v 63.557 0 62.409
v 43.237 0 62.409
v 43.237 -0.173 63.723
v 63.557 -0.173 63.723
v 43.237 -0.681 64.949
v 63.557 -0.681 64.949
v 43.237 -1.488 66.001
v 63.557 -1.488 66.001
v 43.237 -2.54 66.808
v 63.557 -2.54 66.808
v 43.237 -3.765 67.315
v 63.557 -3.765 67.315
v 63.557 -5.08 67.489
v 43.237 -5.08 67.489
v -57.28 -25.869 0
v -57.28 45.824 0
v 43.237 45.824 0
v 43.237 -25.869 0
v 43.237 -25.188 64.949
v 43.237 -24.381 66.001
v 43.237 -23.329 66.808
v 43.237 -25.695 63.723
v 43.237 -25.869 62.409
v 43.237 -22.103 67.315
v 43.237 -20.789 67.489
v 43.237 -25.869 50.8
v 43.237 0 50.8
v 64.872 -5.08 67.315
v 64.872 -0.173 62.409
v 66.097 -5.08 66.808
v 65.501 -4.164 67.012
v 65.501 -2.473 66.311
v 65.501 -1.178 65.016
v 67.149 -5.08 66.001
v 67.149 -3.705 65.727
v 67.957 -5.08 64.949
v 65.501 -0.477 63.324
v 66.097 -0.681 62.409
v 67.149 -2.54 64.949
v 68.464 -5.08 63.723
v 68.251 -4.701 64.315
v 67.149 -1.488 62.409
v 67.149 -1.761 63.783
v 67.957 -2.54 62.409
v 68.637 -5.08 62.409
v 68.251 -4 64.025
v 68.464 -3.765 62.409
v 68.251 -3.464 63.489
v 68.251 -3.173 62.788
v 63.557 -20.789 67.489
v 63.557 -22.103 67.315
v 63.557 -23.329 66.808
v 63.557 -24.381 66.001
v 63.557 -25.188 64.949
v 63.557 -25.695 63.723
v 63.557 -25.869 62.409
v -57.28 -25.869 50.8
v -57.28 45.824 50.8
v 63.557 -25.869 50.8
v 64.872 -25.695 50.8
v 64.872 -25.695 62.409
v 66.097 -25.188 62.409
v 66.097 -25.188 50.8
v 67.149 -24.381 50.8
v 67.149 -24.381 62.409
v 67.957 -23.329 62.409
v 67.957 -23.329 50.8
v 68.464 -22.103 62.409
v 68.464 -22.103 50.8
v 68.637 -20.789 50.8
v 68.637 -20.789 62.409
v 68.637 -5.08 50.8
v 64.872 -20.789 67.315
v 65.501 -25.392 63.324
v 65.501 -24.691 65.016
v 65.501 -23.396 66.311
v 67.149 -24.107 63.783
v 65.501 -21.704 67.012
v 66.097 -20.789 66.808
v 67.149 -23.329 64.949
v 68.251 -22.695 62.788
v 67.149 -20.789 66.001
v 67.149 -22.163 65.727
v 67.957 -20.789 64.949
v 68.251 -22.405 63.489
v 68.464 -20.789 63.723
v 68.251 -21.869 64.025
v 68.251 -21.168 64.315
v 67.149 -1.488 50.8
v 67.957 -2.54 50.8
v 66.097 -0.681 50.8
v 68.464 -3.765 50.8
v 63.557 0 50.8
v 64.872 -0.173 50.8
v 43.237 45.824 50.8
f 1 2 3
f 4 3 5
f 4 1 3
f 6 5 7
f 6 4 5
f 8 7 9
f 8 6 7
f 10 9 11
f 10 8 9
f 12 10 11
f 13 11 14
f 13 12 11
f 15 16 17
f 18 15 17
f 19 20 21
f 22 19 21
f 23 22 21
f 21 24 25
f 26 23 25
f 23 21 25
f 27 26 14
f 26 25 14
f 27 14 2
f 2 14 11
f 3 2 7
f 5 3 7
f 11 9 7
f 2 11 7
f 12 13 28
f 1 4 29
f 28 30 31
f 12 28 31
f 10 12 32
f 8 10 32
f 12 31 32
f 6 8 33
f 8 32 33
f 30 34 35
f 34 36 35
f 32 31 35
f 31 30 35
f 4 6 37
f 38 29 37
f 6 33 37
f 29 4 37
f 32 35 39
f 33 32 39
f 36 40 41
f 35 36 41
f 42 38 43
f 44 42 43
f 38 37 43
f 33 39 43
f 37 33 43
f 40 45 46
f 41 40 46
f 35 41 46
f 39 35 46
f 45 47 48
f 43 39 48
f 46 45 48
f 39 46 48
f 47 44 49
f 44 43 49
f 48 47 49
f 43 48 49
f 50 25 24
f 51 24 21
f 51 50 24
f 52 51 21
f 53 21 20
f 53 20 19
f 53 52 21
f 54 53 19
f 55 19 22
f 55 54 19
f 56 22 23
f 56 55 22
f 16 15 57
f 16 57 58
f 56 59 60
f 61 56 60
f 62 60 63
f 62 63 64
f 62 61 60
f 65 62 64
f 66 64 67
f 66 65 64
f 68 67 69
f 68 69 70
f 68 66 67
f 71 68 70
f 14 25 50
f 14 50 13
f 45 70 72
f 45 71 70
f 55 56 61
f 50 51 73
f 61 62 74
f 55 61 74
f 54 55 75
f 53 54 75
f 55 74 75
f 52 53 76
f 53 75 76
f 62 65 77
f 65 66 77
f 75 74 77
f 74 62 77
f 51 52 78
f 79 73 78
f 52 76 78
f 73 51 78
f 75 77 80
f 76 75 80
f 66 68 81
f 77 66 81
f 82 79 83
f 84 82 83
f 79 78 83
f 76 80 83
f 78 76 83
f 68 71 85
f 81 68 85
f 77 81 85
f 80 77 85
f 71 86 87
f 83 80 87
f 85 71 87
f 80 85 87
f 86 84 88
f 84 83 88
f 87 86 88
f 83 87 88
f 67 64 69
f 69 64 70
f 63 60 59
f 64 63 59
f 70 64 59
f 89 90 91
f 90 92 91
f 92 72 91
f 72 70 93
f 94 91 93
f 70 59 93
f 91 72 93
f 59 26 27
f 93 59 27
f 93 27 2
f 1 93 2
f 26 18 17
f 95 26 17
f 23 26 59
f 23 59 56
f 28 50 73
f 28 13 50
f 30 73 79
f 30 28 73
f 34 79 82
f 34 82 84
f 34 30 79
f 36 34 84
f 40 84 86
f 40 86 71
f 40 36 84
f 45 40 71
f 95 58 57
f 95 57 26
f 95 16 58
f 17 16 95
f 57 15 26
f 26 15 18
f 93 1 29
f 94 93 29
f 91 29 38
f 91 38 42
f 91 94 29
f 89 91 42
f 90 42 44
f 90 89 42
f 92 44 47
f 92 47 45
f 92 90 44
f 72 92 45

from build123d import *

# Parameters (mm, degrees)
F0_W     = 100.51769
F0_H     = 71.692765
F1_DEPTH = 50.799999
F2_W     = 25.868505
F2_H     = 16.688574
F3_DEPTH = 25.4
F4_R     = 5.08
F5_R     = 5.08
F6_R     = 5.08


with BuildPart() as f1:
    # F0 (on Top) → F1 (new body)
    with BuildSketch(Plane.XY):
        with Locations((-7.021472, 9.977877)):
            Rectangle(F0_W, F0_H)
    extrude(amount=F1_DEPTH)


with BuildPart() as f3:
    # F2 (on face) → F3 (new body)
    with BuildSketch(Plane.YZ.offset(43.237373)):
        with Locations((-12.934252, 59.144286)):
            Rectangle(F2_W, F2_H)
    extrude(amount=F3_DEPTH)

    # F4
    f4_edges = [f3.edges().sort_by_distance(p)[0] for p in [
        (55.937373, 0, 67.488573),
    ]]
    fillet(f4_edges, radius=F4_R)

    # F5
    f5_edges = [f3.edges().sort_by_distance(p)[0] for p in [
        (55.937373, -25.868505, 67.488573),
    ]]
    fillet(f5_edges, radius=F5_R)

    # F6
    f6_edges = [f3.edges().sort_by_distance(p)[0] for p in [
        (68.637373, -12.934253, 67.488573),
    ]]
    fillet(f6_edges, radius=F6_R)


solid = Compound([f1.part, f3.part])
